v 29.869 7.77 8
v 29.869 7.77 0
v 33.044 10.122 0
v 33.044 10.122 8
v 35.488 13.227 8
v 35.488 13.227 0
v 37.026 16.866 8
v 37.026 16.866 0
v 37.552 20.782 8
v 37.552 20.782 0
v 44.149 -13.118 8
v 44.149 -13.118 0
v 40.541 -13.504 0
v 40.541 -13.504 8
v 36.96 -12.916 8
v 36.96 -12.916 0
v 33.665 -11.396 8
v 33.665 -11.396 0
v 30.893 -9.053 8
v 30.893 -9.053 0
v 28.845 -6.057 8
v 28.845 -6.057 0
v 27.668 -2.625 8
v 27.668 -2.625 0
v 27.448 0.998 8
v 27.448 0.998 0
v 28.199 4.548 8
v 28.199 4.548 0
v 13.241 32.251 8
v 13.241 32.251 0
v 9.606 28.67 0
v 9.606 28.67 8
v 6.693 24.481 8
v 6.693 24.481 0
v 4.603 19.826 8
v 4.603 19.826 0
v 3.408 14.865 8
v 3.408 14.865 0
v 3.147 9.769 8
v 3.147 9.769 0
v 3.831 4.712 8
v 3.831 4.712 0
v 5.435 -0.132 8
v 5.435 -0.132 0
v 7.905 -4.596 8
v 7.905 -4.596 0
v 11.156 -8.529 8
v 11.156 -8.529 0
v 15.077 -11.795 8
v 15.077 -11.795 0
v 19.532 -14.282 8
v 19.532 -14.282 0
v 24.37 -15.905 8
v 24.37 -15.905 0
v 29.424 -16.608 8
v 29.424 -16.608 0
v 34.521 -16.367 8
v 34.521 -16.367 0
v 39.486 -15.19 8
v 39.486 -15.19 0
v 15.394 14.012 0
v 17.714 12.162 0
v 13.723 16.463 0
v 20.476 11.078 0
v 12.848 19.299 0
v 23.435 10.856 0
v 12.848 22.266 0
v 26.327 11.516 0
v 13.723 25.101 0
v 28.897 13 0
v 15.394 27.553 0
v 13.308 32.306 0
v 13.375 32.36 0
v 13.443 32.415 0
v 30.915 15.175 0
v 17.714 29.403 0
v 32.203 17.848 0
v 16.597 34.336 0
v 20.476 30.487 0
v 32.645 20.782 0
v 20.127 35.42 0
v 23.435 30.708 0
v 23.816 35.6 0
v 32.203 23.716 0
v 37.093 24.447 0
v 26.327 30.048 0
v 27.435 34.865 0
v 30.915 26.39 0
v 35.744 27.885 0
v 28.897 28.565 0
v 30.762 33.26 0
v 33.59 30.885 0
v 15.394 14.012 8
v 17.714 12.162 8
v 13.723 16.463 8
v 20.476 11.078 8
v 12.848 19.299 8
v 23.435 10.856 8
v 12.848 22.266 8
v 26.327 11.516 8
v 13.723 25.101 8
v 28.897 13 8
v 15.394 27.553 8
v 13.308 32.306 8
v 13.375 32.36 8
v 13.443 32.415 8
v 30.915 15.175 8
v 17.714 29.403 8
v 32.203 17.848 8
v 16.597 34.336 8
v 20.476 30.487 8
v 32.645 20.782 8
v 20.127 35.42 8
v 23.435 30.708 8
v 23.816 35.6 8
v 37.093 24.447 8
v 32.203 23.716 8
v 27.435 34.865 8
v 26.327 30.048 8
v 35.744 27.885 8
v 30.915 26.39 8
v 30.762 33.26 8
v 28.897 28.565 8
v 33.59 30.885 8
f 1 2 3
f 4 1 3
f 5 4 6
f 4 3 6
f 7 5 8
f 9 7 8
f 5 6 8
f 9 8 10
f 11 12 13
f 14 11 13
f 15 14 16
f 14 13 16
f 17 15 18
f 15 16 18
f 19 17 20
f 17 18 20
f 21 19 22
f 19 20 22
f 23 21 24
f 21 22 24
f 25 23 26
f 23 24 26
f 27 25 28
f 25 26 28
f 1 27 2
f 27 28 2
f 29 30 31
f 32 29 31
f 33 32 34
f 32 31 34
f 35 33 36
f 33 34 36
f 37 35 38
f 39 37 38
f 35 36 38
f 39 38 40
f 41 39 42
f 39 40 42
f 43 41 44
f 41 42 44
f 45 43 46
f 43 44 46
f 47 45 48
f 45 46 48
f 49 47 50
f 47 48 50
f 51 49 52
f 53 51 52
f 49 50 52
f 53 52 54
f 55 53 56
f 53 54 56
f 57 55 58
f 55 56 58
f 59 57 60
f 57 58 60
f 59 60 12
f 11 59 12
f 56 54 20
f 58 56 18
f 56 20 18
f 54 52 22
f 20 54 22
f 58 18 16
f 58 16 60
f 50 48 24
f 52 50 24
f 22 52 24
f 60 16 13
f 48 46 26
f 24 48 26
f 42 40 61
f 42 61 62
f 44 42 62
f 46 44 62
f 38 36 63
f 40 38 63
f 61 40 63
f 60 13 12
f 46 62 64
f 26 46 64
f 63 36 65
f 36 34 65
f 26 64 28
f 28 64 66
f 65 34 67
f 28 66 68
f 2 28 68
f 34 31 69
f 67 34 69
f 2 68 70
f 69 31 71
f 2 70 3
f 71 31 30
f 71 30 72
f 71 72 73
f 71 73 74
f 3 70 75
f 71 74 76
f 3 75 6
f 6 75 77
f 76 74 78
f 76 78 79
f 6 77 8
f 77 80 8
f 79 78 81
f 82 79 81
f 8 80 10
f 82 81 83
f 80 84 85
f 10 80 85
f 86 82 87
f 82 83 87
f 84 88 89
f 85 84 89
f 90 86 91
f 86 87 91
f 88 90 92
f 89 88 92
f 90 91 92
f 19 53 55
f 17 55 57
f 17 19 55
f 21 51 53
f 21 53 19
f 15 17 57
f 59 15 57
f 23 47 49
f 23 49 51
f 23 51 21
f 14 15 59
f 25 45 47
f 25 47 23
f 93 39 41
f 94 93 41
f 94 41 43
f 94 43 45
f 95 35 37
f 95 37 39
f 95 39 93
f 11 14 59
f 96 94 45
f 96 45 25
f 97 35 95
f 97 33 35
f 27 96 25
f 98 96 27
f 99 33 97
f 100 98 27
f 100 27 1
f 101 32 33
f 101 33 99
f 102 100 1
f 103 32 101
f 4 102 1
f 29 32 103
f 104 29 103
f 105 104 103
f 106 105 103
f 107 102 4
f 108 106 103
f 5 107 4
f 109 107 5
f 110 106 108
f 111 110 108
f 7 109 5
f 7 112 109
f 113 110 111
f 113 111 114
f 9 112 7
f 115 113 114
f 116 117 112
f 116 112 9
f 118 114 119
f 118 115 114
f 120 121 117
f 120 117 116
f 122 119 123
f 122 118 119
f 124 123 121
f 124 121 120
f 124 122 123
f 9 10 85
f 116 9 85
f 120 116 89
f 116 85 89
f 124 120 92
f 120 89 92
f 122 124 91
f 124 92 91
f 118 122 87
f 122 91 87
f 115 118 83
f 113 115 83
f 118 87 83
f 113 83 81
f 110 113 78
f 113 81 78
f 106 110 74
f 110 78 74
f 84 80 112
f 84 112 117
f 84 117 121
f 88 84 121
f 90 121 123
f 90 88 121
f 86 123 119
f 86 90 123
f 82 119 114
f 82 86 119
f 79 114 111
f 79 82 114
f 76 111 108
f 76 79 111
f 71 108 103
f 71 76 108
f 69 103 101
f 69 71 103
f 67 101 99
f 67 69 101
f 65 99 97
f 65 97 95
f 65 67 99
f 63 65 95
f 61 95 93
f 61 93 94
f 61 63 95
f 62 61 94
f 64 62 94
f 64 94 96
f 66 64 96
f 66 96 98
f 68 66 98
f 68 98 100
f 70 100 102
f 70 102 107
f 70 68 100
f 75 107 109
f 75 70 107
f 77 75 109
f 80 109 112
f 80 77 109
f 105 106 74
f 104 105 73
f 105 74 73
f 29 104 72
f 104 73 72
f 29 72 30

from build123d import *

# Parameters (mm, degrees)
F0_R     = 9.953913
F2_DEPTH = 8


with BuildPart() as f2:
    # F0 (on Top) → F2 (new body)
    with BuildSketch(Plane.XY):
        with BuildLine():
            ThreePointArc((29.868933, 7.770019), (35.48766, 13.226767), (37.551685, 20.782295))
            ThreePointArc((37.551685, 20.782295), (29.148663, 34.166644), (13.442543, 32.414685))
            ThreePointArc((13.442543, 32.414685), (13.34143, 32.333237), (13.240702, 32.251313))
            ThreePointArc((13.240702, 32.251313), (10.397613, 12.432448), (29.868933, 7.770019))
        make_face()
        with Locations((22.690865, 20.782295)):
            Circle(F0_R, mode=Mode.SUBTRACT)
        with BuildLine():
            ThreePointArc((44.149149, -13.117656), (29.767923, -7.624333), (29.868933, 7.770019))
            ThreePointArc((29.868933, 7.770019), (10.397613, 12.432448), (13.240702, 32.251313))
            ThreePointArc((13.240702, 32.251313), (7.905379, -4.596433), (44.149149, -13.117656))
        make_face()
    extrude(amount=F2_DEPTH)


solid = f2.part
